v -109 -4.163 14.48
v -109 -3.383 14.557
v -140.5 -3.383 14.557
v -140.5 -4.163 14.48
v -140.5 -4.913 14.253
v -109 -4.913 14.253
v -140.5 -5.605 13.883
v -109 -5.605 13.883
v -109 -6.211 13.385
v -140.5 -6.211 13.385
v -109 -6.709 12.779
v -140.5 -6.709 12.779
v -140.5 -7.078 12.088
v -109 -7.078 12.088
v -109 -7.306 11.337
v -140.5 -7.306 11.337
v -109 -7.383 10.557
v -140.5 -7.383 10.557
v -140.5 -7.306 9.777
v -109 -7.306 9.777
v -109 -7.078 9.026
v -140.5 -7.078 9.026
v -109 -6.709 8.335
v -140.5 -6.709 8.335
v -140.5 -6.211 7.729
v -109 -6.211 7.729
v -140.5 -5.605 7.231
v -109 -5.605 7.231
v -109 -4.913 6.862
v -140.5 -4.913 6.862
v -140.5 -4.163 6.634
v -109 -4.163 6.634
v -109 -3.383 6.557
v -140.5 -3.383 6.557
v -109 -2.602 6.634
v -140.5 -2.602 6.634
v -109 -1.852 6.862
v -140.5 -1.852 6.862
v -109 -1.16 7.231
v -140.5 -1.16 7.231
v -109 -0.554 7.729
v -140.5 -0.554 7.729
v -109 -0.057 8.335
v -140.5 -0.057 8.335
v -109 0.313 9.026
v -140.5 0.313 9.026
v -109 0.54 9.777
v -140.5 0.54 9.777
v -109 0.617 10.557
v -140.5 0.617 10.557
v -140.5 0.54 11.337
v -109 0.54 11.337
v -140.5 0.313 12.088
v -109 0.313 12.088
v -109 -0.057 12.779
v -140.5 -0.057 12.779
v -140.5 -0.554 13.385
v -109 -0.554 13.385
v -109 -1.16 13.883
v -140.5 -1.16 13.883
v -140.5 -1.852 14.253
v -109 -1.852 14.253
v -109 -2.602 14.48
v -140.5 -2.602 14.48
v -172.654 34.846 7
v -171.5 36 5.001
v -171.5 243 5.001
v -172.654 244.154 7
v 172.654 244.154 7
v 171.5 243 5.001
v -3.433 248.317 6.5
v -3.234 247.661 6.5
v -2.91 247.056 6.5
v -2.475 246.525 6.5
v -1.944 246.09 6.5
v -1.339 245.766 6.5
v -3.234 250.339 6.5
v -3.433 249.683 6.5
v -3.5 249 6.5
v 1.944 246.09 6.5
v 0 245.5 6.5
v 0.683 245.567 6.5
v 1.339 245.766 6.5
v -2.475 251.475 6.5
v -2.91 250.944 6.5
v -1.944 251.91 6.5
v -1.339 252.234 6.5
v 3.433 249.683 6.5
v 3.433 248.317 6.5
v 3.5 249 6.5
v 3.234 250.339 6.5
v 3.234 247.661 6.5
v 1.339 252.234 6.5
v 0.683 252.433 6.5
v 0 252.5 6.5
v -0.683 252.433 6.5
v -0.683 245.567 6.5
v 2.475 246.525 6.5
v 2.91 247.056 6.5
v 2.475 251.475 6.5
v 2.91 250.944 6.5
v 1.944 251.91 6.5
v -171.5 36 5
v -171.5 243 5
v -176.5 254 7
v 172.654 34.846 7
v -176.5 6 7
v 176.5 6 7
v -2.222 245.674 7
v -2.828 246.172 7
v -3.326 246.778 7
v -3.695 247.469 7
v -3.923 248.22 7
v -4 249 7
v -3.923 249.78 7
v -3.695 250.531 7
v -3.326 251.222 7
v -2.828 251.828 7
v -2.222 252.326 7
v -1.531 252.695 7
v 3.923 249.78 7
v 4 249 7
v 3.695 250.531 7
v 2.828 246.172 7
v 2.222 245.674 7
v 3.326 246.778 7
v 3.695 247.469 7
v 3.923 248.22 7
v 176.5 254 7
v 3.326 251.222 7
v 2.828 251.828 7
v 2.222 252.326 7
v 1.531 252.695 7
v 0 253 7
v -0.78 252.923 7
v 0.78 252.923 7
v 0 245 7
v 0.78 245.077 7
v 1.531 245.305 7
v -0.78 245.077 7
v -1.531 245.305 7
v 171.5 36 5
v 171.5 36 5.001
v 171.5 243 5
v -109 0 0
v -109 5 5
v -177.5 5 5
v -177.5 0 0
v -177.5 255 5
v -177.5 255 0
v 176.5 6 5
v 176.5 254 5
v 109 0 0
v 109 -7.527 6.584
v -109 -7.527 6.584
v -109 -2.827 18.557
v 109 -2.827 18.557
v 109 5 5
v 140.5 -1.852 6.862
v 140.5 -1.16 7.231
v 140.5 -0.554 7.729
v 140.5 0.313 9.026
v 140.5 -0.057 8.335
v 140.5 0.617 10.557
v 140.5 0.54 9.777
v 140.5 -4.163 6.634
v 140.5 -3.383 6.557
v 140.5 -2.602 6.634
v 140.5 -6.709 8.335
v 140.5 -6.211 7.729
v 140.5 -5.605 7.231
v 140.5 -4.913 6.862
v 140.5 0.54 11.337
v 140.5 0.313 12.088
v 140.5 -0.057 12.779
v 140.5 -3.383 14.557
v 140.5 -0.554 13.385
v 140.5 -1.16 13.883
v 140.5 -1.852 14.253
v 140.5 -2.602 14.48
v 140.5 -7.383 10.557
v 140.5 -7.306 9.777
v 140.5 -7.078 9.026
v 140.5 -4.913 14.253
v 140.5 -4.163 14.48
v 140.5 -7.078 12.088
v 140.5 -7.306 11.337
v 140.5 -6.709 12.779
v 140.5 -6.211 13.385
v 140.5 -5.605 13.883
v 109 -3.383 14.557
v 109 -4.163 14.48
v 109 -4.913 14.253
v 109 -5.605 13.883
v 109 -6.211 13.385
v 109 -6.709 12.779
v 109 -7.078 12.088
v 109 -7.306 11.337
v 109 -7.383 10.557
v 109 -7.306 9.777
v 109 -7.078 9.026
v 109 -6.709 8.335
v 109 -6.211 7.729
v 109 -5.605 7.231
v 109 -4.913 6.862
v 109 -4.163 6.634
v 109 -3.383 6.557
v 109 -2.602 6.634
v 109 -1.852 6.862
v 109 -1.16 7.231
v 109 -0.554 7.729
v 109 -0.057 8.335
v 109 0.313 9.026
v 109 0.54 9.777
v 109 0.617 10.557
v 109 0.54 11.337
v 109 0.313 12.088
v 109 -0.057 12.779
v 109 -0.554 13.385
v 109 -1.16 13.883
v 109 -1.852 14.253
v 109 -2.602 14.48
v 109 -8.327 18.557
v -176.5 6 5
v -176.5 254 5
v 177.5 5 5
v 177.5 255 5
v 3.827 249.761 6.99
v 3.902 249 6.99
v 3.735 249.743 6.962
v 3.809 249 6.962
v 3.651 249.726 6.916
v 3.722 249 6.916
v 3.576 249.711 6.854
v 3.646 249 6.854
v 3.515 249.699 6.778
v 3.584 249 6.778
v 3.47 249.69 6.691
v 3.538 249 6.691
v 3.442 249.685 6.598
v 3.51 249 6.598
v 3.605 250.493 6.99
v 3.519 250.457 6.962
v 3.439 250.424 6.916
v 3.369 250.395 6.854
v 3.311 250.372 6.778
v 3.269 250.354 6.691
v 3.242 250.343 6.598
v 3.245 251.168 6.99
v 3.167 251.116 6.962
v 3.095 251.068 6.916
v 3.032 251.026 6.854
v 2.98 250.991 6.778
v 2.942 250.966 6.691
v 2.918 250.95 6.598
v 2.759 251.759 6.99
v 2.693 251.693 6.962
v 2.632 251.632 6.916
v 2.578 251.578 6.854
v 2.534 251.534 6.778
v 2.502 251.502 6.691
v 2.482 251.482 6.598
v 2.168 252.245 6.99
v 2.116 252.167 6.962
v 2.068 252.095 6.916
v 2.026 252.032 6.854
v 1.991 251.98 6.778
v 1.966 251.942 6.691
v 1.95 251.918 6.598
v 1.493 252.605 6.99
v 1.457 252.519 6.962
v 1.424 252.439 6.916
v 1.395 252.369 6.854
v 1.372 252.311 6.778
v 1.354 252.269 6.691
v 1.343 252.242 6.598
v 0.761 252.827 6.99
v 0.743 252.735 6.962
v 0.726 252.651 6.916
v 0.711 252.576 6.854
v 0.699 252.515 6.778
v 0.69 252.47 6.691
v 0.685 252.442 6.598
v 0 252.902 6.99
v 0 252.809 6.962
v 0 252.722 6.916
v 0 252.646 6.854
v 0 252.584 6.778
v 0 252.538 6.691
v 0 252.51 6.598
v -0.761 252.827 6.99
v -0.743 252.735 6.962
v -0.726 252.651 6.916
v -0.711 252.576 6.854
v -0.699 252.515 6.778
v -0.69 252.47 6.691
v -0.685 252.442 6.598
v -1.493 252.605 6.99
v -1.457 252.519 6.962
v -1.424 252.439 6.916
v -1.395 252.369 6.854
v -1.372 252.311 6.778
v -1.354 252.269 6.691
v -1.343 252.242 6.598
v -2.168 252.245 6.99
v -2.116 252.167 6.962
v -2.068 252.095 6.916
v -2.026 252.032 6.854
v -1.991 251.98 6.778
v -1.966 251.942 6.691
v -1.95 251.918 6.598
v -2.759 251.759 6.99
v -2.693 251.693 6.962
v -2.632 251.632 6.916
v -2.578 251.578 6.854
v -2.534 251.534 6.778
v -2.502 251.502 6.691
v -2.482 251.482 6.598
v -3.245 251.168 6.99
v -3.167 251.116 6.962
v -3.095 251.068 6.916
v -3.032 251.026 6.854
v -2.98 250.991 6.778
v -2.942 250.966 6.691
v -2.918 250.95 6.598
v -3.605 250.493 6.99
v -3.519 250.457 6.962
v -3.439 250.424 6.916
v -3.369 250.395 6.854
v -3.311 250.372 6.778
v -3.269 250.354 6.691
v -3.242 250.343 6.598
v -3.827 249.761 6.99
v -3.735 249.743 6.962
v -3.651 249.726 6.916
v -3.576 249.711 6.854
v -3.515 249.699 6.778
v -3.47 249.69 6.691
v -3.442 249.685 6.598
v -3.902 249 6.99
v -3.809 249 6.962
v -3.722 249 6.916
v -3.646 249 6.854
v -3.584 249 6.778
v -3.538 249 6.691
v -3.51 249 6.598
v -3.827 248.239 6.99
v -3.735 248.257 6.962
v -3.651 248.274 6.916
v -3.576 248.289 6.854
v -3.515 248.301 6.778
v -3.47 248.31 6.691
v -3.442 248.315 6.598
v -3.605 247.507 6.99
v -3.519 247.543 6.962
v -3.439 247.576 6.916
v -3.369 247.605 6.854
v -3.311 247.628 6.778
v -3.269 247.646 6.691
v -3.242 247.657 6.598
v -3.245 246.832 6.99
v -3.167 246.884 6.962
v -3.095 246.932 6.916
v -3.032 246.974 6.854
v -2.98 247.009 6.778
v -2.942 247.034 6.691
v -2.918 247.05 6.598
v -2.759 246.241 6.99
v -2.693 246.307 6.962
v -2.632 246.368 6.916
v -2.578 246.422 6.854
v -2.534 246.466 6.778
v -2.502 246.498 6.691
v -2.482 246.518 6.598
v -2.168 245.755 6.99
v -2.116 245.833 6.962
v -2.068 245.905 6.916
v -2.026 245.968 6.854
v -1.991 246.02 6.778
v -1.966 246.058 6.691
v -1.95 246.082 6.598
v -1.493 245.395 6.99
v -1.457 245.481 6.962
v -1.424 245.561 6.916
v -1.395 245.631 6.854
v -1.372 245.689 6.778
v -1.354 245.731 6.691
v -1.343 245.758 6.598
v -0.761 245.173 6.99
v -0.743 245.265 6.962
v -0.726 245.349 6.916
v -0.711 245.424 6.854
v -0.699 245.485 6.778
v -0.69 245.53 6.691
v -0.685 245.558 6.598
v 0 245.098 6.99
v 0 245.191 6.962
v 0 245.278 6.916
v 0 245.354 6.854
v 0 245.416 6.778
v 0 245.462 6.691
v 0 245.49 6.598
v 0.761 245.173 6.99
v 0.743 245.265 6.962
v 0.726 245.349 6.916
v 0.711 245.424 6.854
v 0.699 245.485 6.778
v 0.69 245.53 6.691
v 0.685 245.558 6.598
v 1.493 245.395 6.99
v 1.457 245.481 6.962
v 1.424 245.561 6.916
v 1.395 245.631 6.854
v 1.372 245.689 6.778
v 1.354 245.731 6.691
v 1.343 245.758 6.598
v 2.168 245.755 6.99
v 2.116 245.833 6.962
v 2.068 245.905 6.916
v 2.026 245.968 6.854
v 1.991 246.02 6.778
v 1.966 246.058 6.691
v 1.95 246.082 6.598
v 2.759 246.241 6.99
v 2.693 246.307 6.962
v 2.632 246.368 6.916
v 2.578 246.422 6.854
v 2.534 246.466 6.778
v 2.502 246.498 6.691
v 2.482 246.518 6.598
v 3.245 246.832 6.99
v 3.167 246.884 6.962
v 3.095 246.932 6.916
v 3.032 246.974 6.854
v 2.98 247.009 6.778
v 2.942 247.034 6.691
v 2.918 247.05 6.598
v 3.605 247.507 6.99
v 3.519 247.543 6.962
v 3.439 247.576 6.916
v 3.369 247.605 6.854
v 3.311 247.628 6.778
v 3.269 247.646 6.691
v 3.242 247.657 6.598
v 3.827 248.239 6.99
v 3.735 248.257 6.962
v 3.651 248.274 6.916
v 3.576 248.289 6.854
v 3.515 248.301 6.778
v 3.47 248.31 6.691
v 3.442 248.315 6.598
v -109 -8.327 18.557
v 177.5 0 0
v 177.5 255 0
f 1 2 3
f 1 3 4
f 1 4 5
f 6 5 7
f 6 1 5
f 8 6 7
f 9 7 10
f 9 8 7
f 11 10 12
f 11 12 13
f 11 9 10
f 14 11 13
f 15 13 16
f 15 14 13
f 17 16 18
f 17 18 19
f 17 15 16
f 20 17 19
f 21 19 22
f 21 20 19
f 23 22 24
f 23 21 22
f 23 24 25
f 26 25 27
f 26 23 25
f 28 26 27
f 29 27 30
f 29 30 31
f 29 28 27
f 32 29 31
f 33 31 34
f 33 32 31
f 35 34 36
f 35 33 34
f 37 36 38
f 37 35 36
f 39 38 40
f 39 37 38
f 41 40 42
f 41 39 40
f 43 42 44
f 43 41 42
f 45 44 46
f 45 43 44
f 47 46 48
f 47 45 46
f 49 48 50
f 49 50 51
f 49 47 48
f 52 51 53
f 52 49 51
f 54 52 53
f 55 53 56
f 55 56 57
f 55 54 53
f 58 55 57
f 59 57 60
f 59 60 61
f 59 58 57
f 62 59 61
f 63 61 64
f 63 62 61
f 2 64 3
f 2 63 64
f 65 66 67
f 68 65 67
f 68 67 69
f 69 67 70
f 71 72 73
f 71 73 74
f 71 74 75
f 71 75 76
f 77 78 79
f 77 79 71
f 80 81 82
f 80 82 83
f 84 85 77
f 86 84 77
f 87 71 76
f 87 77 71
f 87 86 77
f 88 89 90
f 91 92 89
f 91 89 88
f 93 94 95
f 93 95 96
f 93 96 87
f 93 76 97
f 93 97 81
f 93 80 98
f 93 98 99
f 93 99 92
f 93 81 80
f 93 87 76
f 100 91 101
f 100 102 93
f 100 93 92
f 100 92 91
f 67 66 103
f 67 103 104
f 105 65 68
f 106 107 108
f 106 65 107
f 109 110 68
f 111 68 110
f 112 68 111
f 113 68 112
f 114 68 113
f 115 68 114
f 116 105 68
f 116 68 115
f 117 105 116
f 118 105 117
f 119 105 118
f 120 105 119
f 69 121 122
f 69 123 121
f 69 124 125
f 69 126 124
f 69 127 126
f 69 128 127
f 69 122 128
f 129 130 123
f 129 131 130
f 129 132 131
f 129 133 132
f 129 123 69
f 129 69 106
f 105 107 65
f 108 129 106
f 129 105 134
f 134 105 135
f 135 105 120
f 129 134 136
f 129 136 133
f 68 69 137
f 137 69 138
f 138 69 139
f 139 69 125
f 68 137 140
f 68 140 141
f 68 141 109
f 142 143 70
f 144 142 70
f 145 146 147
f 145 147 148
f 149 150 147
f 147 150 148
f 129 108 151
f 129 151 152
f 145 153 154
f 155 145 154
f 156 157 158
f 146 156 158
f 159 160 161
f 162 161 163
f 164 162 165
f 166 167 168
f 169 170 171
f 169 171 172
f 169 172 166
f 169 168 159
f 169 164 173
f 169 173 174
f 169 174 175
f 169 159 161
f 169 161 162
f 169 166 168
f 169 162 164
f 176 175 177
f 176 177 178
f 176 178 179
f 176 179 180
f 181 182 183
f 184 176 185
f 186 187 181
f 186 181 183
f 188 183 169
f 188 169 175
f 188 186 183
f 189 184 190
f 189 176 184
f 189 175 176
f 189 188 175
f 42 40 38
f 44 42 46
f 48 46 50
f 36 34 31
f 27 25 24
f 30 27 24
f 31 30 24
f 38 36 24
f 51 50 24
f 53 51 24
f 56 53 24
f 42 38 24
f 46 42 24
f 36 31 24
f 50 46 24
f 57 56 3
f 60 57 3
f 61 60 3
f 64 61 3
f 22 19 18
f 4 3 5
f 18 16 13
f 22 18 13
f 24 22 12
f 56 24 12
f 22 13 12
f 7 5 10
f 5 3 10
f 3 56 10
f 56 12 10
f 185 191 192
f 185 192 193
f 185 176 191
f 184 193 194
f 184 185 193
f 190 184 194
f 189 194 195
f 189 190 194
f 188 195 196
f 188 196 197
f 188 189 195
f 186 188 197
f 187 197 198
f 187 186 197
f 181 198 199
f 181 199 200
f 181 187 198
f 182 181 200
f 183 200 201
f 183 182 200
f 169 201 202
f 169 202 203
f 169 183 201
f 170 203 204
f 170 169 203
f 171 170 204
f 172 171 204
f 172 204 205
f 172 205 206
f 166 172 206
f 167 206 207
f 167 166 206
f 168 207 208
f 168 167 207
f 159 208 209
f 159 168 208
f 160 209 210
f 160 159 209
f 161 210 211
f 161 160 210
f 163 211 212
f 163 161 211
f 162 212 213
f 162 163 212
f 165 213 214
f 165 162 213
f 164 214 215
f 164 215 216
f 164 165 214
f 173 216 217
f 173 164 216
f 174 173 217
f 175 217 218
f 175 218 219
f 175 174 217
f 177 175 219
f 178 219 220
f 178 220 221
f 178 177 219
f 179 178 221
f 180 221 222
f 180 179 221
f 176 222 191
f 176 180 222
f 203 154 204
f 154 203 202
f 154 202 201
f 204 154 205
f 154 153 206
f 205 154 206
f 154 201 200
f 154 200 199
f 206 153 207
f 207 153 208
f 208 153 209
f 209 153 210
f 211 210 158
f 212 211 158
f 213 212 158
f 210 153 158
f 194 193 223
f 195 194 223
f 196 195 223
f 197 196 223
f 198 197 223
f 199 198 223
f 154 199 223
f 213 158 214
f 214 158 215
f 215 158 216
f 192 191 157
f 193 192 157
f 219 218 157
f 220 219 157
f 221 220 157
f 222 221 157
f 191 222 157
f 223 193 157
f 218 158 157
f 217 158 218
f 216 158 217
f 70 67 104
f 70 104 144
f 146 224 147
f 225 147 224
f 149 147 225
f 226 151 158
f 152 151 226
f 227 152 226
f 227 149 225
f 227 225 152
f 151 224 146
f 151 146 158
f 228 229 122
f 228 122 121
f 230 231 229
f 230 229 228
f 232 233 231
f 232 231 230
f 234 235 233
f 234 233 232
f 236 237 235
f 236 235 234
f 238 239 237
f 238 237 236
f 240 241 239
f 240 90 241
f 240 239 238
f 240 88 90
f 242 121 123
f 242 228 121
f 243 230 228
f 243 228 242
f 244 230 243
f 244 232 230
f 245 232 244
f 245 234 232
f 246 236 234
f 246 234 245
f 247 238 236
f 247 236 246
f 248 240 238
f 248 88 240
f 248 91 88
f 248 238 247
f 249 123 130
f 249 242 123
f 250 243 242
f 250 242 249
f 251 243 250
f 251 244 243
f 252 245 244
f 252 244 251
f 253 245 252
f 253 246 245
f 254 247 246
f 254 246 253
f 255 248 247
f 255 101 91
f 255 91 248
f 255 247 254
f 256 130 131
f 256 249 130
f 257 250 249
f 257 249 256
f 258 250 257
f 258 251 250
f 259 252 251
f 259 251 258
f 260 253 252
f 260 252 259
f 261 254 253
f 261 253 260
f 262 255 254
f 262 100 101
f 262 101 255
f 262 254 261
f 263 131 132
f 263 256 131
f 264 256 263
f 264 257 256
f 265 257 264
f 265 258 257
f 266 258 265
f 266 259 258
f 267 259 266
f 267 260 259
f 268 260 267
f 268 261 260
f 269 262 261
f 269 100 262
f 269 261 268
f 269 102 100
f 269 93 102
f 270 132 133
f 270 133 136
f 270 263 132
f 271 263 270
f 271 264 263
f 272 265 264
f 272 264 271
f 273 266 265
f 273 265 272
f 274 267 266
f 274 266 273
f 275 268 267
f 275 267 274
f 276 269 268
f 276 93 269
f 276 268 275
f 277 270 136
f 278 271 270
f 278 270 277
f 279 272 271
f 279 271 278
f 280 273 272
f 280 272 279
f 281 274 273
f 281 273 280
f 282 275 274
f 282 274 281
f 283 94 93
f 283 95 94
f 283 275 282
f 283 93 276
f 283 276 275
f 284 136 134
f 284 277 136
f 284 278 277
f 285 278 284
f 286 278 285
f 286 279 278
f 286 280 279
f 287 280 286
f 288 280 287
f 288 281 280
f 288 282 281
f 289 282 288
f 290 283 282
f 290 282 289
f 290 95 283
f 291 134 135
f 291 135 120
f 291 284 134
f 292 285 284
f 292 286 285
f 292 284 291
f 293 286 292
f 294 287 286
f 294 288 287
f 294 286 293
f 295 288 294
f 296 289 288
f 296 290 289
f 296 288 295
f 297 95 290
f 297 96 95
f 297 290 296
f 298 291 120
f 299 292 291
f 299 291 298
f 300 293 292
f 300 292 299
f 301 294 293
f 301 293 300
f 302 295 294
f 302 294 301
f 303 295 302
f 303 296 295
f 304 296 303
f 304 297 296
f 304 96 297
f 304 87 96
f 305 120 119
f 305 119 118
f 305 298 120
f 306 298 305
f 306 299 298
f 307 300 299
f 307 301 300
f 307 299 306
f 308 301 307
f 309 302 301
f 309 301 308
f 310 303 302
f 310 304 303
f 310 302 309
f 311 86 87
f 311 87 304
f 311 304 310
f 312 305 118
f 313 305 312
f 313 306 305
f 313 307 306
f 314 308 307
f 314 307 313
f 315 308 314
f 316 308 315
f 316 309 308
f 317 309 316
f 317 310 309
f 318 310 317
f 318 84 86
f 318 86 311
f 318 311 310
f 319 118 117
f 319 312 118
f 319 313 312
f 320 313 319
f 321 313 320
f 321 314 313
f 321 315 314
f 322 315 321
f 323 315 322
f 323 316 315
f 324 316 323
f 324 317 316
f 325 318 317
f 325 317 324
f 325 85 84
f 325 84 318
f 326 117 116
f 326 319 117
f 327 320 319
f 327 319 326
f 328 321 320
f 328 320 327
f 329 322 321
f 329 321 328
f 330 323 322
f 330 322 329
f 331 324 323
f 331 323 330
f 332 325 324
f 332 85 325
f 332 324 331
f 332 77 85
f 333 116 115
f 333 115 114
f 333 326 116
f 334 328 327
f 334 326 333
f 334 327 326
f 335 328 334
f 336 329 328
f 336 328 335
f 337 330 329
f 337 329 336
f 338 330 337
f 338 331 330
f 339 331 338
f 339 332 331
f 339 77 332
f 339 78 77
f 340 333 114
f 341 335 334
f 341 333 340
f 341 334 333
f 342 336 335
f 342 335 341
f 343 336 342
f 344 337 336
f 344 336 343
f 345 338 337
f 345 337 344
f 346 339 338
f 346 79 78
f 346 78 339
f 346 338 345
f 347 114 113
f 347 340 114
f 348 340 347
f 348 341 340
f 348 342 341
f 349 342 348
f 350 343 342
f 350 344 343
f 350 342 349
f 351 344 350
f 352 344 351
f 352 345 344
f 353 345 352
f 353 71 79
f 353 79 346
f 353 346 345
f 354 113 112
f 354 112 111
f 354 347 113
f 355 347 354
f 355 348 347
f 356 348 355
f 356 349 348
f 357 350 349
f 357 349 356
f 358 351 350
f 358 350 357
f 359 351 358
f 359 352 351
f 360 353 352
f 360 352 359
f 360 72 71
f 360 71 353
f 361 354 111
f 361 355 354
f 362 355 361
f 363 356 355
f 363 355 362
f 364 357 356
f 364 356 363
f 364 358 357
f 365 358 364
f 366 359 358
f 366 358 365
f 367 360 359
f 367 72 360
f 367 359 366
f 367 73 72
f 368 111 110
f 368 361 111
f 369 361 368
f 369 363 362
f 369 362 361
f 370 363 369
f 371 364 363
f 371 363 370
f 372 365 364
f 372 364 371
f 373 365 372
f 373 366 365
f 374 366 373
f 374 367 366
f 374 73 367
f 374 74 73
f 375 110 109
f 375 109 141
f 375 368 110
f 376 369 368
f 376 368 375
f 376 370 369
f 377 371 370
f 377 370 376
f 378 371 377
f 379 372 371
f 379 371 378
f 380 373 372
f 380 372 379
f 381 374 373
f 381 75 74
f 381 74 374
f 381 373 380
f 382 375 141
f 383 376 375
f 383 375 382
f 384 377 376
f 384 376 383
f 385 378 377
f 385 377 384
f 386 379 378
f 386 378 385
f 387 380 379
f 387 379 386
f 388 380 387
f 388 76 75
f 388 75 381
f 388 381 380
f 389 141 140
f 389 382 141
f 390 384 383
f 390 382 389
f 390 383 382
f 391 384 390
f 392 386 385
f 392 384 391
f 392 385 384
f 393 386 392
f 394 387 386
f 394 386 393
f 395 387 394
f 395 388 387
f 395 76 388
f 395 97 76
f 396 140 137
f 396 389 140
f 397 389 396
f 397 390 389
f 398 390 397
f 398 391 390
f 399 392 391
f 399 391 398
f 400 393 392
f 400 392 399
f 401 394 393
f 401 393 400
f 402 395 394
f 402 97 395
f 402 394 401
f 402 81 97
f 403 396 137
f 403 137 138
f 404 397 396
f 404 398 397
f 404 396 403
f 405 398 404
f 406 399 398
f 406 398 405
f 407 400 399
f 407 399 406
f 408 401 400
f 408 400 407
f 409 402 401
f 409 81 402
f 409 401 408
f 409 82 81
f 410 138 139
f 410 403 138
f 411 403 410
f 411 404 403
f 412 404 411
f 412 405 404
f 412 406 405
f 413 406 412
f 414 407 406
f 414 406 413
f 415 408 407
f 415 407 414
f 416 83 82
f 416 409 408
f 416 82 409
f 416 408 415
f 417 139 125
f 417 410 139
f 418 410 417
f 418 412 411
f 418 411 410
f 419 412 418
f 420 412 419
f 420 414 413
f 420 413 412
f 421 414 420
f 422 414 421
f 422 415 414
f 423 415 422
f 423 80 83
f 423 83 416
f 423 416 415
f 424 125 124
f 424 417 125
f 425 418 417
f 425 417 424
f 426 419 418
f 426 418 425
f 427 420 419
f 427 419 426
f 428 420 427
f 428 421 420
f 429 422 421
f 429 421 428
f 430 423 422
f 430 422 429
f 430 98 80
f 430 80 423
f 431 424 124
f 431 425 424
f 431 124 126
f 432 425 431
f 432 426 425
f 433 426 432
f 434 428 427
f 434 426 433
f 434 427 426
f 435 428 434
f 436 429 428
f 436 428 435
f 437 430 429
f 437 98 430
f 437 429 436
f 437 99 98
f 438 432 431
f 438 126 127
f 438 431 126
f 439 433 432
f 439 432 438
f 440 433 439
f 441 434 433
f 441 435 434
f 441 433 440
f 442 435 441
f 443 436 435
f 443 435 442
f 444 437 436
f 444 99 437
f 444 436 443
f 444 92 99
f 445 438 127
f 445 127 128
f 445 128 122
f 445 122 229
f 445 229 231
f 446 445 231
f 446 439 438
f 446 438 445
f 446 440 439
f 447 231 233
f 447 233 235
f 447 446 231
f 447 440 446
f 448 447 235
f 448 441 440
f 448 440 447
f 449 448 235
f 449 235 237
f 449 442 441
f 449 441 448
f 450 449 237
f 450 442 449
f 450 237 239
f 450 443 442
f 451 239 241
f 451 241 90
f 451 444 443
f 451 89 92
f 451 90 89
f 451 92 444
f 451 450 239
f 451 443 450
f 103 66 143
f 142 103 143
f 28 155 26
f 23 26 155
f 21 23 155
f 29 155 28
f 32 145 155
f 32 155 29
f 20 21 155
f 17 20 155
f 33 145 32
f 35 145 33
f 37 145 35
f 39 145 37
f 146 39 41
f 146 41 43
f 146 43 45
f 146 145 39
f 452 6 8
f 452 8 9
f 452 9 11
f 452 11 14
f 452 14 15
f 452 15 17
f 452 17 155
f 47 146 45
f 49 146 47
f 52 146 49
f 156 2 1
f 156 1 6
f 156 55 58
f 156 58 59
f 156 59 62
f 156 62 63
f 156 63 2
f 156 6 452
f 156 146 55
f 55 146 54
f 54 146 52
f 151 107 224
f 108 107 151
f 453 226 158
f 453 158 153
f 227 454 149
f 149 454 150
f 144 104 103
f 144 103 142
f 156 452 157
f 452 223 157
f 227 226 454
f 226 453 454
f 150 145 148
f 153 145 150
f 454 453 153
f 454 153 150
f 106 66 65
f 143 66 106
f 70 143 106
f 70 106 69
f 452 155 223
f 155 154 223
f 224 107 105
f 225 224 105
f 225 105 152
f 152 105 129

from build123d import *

# Parameters (mm, degrees)
EXTRUDE_1_DEPTH       = 177.5
EXTRUDE_2_DEPTH       = 109
EXTRUDE_3_DEPTH       = 2
SKETCH_5_W            = 355
SKETCH_5_H            = 250
SKETCH_5_W_2          = 353
SKETCH_5_H_2          = 248
CUT_EXTRUDE_1_DEPTH   = 2
SKETCH_6_W            = 343
SKETCH_6_H            = 207
CUT_EXTRUDE_1_2_DEPTH = 2
CHAMFER_1_SIZE        = 1.154
CHAMFER_1_SIZE2       = 1.998786632
SKETCH_7_R            = 3.5
CUT_EXTRUDE_2_DEPTH   = 0.5
FILLET_1_R            = 0.5
SKETCH_8_R            = 4
EXTRUDE_4_DEPTH       = 140.5


with BuildPart() as part:
    # 草图1 → 凸台-拉伸1 (new, symmetric)
    with BuildSketch(Plane(origin=(0, 0, 0), x_dir=(0, 0, -1), z_dir=(1, 0, 0))):
        Polygon((0, 0), (0, 255), (-5, 255), (-5, 5), align=None)
    extrude(amount=EXTRUDE_1_DEPTH, both=True)

    # 草图3 → 凸台-拉伸2 (add, symmetric)
    with BuildSketch(Plane(origin=(0, 0, 0), x_dir=(0, 0, -1), z_dir=(1, 0, 0))):
        Polygon((0, 0), (-6.583760775, -7.526891394), (-18.557046178, -8.32716426), (-18.557046178, -2.82716426), (-5, 5), align=None)
    extrude(amount=EXTRUDE_2_DEPTH, both=True)

    # 草图4 → 凸台-拉伸3 (add)
    with BuildSketch(Plane.XY.offset(5)):
        Polygon((-177.5, 255), (-177.5, 5), (-109, 5), (109, 5), (177.5, 5), (177.5, 255), align=None)
    extrude(amount=EXTRUDE_3_DEPTH)

    # 草图5 → Cut-Extrude 1 (cut)
    with BuildSketch(Plane.XY.offset(7)):
        with Locations((0, 130)):
            Rectangle(SKETCH_5_W, SKETCH_5_H)
        with Locations((0, 130)):
            Rectangle(SKETCH_5_W_2, SKETCH_5_H_2, mode=Mode.SUBTRACT)
    extrude(amount=-CUT_EXTRUDE_1_DEPTH, mode=Mode.SUBTRACT)

    # 草图6 → Cut-Extrude 1 2 (cut)
    with BuildSketch(Plane.XY.offset(7)):
        with Locations((0, 139.5)):
            Rectangle(SKETCH_6_W, SKETCH_6_H)
    extrude(amount=-CUT_EXTRUDE_1_2_DEPTH, mode=Mode.SUBTRACT)

    # 倒角1
    chamfer_1_edges = [part.edges().sort_by_distance(p)[0] for p in [
        (-171.5, 139.5, 7),
        (0, 36, 7),
        (171.5, 139.5, 7),
        (0, 243, 7),
    ]]
    chamfer_1_side = [part.faces().sort_by_distance(p)[0] for p in [
        (0, 10.314081594, 7),
    ]]
    chamfer(chamfer_1_edges, length=CHAMFER_1_SIZE, length2=CHAMFER_1_SIZE2, reference=chamfer_1_side[0])

    # 草图7 → 切除-拉伸2 (cut)
    with BuildSketch(Plane.XY.offset(7)):
        with Locations((0, 249)):
            Circle(SKETCH_7_R)
    extrude(amount=-CUT_EXTRUDE_2_DEPTH, mode=Mode.SUBTRACT)

    # 圆角1
    fillet_1_edges = [part.edges().sort_by_distance(p)[0] for p in [
        (-3.5, 249, 7),
    ]]
    fillet(fillet_1_edges, radius=FILLET_1_R - 0.0001)  # a hair under: the kernel refuses the full size

    # 草图8 → 凸台-拉伸4 (add, symmetric)
    with BuildSketch(Plane(origin=(0, 0, 0), x_dir=(0, 0, -1), z_dir=(1, 0, 0))):
        with Locations(Location((-10.557046178, -3.382641438, 0), (0, 0, 180))):
            Circle(SKETCH_8_R)
    extrude(amount=EXTRUDE_4_DEPTH, both=True)


solid = part.part
